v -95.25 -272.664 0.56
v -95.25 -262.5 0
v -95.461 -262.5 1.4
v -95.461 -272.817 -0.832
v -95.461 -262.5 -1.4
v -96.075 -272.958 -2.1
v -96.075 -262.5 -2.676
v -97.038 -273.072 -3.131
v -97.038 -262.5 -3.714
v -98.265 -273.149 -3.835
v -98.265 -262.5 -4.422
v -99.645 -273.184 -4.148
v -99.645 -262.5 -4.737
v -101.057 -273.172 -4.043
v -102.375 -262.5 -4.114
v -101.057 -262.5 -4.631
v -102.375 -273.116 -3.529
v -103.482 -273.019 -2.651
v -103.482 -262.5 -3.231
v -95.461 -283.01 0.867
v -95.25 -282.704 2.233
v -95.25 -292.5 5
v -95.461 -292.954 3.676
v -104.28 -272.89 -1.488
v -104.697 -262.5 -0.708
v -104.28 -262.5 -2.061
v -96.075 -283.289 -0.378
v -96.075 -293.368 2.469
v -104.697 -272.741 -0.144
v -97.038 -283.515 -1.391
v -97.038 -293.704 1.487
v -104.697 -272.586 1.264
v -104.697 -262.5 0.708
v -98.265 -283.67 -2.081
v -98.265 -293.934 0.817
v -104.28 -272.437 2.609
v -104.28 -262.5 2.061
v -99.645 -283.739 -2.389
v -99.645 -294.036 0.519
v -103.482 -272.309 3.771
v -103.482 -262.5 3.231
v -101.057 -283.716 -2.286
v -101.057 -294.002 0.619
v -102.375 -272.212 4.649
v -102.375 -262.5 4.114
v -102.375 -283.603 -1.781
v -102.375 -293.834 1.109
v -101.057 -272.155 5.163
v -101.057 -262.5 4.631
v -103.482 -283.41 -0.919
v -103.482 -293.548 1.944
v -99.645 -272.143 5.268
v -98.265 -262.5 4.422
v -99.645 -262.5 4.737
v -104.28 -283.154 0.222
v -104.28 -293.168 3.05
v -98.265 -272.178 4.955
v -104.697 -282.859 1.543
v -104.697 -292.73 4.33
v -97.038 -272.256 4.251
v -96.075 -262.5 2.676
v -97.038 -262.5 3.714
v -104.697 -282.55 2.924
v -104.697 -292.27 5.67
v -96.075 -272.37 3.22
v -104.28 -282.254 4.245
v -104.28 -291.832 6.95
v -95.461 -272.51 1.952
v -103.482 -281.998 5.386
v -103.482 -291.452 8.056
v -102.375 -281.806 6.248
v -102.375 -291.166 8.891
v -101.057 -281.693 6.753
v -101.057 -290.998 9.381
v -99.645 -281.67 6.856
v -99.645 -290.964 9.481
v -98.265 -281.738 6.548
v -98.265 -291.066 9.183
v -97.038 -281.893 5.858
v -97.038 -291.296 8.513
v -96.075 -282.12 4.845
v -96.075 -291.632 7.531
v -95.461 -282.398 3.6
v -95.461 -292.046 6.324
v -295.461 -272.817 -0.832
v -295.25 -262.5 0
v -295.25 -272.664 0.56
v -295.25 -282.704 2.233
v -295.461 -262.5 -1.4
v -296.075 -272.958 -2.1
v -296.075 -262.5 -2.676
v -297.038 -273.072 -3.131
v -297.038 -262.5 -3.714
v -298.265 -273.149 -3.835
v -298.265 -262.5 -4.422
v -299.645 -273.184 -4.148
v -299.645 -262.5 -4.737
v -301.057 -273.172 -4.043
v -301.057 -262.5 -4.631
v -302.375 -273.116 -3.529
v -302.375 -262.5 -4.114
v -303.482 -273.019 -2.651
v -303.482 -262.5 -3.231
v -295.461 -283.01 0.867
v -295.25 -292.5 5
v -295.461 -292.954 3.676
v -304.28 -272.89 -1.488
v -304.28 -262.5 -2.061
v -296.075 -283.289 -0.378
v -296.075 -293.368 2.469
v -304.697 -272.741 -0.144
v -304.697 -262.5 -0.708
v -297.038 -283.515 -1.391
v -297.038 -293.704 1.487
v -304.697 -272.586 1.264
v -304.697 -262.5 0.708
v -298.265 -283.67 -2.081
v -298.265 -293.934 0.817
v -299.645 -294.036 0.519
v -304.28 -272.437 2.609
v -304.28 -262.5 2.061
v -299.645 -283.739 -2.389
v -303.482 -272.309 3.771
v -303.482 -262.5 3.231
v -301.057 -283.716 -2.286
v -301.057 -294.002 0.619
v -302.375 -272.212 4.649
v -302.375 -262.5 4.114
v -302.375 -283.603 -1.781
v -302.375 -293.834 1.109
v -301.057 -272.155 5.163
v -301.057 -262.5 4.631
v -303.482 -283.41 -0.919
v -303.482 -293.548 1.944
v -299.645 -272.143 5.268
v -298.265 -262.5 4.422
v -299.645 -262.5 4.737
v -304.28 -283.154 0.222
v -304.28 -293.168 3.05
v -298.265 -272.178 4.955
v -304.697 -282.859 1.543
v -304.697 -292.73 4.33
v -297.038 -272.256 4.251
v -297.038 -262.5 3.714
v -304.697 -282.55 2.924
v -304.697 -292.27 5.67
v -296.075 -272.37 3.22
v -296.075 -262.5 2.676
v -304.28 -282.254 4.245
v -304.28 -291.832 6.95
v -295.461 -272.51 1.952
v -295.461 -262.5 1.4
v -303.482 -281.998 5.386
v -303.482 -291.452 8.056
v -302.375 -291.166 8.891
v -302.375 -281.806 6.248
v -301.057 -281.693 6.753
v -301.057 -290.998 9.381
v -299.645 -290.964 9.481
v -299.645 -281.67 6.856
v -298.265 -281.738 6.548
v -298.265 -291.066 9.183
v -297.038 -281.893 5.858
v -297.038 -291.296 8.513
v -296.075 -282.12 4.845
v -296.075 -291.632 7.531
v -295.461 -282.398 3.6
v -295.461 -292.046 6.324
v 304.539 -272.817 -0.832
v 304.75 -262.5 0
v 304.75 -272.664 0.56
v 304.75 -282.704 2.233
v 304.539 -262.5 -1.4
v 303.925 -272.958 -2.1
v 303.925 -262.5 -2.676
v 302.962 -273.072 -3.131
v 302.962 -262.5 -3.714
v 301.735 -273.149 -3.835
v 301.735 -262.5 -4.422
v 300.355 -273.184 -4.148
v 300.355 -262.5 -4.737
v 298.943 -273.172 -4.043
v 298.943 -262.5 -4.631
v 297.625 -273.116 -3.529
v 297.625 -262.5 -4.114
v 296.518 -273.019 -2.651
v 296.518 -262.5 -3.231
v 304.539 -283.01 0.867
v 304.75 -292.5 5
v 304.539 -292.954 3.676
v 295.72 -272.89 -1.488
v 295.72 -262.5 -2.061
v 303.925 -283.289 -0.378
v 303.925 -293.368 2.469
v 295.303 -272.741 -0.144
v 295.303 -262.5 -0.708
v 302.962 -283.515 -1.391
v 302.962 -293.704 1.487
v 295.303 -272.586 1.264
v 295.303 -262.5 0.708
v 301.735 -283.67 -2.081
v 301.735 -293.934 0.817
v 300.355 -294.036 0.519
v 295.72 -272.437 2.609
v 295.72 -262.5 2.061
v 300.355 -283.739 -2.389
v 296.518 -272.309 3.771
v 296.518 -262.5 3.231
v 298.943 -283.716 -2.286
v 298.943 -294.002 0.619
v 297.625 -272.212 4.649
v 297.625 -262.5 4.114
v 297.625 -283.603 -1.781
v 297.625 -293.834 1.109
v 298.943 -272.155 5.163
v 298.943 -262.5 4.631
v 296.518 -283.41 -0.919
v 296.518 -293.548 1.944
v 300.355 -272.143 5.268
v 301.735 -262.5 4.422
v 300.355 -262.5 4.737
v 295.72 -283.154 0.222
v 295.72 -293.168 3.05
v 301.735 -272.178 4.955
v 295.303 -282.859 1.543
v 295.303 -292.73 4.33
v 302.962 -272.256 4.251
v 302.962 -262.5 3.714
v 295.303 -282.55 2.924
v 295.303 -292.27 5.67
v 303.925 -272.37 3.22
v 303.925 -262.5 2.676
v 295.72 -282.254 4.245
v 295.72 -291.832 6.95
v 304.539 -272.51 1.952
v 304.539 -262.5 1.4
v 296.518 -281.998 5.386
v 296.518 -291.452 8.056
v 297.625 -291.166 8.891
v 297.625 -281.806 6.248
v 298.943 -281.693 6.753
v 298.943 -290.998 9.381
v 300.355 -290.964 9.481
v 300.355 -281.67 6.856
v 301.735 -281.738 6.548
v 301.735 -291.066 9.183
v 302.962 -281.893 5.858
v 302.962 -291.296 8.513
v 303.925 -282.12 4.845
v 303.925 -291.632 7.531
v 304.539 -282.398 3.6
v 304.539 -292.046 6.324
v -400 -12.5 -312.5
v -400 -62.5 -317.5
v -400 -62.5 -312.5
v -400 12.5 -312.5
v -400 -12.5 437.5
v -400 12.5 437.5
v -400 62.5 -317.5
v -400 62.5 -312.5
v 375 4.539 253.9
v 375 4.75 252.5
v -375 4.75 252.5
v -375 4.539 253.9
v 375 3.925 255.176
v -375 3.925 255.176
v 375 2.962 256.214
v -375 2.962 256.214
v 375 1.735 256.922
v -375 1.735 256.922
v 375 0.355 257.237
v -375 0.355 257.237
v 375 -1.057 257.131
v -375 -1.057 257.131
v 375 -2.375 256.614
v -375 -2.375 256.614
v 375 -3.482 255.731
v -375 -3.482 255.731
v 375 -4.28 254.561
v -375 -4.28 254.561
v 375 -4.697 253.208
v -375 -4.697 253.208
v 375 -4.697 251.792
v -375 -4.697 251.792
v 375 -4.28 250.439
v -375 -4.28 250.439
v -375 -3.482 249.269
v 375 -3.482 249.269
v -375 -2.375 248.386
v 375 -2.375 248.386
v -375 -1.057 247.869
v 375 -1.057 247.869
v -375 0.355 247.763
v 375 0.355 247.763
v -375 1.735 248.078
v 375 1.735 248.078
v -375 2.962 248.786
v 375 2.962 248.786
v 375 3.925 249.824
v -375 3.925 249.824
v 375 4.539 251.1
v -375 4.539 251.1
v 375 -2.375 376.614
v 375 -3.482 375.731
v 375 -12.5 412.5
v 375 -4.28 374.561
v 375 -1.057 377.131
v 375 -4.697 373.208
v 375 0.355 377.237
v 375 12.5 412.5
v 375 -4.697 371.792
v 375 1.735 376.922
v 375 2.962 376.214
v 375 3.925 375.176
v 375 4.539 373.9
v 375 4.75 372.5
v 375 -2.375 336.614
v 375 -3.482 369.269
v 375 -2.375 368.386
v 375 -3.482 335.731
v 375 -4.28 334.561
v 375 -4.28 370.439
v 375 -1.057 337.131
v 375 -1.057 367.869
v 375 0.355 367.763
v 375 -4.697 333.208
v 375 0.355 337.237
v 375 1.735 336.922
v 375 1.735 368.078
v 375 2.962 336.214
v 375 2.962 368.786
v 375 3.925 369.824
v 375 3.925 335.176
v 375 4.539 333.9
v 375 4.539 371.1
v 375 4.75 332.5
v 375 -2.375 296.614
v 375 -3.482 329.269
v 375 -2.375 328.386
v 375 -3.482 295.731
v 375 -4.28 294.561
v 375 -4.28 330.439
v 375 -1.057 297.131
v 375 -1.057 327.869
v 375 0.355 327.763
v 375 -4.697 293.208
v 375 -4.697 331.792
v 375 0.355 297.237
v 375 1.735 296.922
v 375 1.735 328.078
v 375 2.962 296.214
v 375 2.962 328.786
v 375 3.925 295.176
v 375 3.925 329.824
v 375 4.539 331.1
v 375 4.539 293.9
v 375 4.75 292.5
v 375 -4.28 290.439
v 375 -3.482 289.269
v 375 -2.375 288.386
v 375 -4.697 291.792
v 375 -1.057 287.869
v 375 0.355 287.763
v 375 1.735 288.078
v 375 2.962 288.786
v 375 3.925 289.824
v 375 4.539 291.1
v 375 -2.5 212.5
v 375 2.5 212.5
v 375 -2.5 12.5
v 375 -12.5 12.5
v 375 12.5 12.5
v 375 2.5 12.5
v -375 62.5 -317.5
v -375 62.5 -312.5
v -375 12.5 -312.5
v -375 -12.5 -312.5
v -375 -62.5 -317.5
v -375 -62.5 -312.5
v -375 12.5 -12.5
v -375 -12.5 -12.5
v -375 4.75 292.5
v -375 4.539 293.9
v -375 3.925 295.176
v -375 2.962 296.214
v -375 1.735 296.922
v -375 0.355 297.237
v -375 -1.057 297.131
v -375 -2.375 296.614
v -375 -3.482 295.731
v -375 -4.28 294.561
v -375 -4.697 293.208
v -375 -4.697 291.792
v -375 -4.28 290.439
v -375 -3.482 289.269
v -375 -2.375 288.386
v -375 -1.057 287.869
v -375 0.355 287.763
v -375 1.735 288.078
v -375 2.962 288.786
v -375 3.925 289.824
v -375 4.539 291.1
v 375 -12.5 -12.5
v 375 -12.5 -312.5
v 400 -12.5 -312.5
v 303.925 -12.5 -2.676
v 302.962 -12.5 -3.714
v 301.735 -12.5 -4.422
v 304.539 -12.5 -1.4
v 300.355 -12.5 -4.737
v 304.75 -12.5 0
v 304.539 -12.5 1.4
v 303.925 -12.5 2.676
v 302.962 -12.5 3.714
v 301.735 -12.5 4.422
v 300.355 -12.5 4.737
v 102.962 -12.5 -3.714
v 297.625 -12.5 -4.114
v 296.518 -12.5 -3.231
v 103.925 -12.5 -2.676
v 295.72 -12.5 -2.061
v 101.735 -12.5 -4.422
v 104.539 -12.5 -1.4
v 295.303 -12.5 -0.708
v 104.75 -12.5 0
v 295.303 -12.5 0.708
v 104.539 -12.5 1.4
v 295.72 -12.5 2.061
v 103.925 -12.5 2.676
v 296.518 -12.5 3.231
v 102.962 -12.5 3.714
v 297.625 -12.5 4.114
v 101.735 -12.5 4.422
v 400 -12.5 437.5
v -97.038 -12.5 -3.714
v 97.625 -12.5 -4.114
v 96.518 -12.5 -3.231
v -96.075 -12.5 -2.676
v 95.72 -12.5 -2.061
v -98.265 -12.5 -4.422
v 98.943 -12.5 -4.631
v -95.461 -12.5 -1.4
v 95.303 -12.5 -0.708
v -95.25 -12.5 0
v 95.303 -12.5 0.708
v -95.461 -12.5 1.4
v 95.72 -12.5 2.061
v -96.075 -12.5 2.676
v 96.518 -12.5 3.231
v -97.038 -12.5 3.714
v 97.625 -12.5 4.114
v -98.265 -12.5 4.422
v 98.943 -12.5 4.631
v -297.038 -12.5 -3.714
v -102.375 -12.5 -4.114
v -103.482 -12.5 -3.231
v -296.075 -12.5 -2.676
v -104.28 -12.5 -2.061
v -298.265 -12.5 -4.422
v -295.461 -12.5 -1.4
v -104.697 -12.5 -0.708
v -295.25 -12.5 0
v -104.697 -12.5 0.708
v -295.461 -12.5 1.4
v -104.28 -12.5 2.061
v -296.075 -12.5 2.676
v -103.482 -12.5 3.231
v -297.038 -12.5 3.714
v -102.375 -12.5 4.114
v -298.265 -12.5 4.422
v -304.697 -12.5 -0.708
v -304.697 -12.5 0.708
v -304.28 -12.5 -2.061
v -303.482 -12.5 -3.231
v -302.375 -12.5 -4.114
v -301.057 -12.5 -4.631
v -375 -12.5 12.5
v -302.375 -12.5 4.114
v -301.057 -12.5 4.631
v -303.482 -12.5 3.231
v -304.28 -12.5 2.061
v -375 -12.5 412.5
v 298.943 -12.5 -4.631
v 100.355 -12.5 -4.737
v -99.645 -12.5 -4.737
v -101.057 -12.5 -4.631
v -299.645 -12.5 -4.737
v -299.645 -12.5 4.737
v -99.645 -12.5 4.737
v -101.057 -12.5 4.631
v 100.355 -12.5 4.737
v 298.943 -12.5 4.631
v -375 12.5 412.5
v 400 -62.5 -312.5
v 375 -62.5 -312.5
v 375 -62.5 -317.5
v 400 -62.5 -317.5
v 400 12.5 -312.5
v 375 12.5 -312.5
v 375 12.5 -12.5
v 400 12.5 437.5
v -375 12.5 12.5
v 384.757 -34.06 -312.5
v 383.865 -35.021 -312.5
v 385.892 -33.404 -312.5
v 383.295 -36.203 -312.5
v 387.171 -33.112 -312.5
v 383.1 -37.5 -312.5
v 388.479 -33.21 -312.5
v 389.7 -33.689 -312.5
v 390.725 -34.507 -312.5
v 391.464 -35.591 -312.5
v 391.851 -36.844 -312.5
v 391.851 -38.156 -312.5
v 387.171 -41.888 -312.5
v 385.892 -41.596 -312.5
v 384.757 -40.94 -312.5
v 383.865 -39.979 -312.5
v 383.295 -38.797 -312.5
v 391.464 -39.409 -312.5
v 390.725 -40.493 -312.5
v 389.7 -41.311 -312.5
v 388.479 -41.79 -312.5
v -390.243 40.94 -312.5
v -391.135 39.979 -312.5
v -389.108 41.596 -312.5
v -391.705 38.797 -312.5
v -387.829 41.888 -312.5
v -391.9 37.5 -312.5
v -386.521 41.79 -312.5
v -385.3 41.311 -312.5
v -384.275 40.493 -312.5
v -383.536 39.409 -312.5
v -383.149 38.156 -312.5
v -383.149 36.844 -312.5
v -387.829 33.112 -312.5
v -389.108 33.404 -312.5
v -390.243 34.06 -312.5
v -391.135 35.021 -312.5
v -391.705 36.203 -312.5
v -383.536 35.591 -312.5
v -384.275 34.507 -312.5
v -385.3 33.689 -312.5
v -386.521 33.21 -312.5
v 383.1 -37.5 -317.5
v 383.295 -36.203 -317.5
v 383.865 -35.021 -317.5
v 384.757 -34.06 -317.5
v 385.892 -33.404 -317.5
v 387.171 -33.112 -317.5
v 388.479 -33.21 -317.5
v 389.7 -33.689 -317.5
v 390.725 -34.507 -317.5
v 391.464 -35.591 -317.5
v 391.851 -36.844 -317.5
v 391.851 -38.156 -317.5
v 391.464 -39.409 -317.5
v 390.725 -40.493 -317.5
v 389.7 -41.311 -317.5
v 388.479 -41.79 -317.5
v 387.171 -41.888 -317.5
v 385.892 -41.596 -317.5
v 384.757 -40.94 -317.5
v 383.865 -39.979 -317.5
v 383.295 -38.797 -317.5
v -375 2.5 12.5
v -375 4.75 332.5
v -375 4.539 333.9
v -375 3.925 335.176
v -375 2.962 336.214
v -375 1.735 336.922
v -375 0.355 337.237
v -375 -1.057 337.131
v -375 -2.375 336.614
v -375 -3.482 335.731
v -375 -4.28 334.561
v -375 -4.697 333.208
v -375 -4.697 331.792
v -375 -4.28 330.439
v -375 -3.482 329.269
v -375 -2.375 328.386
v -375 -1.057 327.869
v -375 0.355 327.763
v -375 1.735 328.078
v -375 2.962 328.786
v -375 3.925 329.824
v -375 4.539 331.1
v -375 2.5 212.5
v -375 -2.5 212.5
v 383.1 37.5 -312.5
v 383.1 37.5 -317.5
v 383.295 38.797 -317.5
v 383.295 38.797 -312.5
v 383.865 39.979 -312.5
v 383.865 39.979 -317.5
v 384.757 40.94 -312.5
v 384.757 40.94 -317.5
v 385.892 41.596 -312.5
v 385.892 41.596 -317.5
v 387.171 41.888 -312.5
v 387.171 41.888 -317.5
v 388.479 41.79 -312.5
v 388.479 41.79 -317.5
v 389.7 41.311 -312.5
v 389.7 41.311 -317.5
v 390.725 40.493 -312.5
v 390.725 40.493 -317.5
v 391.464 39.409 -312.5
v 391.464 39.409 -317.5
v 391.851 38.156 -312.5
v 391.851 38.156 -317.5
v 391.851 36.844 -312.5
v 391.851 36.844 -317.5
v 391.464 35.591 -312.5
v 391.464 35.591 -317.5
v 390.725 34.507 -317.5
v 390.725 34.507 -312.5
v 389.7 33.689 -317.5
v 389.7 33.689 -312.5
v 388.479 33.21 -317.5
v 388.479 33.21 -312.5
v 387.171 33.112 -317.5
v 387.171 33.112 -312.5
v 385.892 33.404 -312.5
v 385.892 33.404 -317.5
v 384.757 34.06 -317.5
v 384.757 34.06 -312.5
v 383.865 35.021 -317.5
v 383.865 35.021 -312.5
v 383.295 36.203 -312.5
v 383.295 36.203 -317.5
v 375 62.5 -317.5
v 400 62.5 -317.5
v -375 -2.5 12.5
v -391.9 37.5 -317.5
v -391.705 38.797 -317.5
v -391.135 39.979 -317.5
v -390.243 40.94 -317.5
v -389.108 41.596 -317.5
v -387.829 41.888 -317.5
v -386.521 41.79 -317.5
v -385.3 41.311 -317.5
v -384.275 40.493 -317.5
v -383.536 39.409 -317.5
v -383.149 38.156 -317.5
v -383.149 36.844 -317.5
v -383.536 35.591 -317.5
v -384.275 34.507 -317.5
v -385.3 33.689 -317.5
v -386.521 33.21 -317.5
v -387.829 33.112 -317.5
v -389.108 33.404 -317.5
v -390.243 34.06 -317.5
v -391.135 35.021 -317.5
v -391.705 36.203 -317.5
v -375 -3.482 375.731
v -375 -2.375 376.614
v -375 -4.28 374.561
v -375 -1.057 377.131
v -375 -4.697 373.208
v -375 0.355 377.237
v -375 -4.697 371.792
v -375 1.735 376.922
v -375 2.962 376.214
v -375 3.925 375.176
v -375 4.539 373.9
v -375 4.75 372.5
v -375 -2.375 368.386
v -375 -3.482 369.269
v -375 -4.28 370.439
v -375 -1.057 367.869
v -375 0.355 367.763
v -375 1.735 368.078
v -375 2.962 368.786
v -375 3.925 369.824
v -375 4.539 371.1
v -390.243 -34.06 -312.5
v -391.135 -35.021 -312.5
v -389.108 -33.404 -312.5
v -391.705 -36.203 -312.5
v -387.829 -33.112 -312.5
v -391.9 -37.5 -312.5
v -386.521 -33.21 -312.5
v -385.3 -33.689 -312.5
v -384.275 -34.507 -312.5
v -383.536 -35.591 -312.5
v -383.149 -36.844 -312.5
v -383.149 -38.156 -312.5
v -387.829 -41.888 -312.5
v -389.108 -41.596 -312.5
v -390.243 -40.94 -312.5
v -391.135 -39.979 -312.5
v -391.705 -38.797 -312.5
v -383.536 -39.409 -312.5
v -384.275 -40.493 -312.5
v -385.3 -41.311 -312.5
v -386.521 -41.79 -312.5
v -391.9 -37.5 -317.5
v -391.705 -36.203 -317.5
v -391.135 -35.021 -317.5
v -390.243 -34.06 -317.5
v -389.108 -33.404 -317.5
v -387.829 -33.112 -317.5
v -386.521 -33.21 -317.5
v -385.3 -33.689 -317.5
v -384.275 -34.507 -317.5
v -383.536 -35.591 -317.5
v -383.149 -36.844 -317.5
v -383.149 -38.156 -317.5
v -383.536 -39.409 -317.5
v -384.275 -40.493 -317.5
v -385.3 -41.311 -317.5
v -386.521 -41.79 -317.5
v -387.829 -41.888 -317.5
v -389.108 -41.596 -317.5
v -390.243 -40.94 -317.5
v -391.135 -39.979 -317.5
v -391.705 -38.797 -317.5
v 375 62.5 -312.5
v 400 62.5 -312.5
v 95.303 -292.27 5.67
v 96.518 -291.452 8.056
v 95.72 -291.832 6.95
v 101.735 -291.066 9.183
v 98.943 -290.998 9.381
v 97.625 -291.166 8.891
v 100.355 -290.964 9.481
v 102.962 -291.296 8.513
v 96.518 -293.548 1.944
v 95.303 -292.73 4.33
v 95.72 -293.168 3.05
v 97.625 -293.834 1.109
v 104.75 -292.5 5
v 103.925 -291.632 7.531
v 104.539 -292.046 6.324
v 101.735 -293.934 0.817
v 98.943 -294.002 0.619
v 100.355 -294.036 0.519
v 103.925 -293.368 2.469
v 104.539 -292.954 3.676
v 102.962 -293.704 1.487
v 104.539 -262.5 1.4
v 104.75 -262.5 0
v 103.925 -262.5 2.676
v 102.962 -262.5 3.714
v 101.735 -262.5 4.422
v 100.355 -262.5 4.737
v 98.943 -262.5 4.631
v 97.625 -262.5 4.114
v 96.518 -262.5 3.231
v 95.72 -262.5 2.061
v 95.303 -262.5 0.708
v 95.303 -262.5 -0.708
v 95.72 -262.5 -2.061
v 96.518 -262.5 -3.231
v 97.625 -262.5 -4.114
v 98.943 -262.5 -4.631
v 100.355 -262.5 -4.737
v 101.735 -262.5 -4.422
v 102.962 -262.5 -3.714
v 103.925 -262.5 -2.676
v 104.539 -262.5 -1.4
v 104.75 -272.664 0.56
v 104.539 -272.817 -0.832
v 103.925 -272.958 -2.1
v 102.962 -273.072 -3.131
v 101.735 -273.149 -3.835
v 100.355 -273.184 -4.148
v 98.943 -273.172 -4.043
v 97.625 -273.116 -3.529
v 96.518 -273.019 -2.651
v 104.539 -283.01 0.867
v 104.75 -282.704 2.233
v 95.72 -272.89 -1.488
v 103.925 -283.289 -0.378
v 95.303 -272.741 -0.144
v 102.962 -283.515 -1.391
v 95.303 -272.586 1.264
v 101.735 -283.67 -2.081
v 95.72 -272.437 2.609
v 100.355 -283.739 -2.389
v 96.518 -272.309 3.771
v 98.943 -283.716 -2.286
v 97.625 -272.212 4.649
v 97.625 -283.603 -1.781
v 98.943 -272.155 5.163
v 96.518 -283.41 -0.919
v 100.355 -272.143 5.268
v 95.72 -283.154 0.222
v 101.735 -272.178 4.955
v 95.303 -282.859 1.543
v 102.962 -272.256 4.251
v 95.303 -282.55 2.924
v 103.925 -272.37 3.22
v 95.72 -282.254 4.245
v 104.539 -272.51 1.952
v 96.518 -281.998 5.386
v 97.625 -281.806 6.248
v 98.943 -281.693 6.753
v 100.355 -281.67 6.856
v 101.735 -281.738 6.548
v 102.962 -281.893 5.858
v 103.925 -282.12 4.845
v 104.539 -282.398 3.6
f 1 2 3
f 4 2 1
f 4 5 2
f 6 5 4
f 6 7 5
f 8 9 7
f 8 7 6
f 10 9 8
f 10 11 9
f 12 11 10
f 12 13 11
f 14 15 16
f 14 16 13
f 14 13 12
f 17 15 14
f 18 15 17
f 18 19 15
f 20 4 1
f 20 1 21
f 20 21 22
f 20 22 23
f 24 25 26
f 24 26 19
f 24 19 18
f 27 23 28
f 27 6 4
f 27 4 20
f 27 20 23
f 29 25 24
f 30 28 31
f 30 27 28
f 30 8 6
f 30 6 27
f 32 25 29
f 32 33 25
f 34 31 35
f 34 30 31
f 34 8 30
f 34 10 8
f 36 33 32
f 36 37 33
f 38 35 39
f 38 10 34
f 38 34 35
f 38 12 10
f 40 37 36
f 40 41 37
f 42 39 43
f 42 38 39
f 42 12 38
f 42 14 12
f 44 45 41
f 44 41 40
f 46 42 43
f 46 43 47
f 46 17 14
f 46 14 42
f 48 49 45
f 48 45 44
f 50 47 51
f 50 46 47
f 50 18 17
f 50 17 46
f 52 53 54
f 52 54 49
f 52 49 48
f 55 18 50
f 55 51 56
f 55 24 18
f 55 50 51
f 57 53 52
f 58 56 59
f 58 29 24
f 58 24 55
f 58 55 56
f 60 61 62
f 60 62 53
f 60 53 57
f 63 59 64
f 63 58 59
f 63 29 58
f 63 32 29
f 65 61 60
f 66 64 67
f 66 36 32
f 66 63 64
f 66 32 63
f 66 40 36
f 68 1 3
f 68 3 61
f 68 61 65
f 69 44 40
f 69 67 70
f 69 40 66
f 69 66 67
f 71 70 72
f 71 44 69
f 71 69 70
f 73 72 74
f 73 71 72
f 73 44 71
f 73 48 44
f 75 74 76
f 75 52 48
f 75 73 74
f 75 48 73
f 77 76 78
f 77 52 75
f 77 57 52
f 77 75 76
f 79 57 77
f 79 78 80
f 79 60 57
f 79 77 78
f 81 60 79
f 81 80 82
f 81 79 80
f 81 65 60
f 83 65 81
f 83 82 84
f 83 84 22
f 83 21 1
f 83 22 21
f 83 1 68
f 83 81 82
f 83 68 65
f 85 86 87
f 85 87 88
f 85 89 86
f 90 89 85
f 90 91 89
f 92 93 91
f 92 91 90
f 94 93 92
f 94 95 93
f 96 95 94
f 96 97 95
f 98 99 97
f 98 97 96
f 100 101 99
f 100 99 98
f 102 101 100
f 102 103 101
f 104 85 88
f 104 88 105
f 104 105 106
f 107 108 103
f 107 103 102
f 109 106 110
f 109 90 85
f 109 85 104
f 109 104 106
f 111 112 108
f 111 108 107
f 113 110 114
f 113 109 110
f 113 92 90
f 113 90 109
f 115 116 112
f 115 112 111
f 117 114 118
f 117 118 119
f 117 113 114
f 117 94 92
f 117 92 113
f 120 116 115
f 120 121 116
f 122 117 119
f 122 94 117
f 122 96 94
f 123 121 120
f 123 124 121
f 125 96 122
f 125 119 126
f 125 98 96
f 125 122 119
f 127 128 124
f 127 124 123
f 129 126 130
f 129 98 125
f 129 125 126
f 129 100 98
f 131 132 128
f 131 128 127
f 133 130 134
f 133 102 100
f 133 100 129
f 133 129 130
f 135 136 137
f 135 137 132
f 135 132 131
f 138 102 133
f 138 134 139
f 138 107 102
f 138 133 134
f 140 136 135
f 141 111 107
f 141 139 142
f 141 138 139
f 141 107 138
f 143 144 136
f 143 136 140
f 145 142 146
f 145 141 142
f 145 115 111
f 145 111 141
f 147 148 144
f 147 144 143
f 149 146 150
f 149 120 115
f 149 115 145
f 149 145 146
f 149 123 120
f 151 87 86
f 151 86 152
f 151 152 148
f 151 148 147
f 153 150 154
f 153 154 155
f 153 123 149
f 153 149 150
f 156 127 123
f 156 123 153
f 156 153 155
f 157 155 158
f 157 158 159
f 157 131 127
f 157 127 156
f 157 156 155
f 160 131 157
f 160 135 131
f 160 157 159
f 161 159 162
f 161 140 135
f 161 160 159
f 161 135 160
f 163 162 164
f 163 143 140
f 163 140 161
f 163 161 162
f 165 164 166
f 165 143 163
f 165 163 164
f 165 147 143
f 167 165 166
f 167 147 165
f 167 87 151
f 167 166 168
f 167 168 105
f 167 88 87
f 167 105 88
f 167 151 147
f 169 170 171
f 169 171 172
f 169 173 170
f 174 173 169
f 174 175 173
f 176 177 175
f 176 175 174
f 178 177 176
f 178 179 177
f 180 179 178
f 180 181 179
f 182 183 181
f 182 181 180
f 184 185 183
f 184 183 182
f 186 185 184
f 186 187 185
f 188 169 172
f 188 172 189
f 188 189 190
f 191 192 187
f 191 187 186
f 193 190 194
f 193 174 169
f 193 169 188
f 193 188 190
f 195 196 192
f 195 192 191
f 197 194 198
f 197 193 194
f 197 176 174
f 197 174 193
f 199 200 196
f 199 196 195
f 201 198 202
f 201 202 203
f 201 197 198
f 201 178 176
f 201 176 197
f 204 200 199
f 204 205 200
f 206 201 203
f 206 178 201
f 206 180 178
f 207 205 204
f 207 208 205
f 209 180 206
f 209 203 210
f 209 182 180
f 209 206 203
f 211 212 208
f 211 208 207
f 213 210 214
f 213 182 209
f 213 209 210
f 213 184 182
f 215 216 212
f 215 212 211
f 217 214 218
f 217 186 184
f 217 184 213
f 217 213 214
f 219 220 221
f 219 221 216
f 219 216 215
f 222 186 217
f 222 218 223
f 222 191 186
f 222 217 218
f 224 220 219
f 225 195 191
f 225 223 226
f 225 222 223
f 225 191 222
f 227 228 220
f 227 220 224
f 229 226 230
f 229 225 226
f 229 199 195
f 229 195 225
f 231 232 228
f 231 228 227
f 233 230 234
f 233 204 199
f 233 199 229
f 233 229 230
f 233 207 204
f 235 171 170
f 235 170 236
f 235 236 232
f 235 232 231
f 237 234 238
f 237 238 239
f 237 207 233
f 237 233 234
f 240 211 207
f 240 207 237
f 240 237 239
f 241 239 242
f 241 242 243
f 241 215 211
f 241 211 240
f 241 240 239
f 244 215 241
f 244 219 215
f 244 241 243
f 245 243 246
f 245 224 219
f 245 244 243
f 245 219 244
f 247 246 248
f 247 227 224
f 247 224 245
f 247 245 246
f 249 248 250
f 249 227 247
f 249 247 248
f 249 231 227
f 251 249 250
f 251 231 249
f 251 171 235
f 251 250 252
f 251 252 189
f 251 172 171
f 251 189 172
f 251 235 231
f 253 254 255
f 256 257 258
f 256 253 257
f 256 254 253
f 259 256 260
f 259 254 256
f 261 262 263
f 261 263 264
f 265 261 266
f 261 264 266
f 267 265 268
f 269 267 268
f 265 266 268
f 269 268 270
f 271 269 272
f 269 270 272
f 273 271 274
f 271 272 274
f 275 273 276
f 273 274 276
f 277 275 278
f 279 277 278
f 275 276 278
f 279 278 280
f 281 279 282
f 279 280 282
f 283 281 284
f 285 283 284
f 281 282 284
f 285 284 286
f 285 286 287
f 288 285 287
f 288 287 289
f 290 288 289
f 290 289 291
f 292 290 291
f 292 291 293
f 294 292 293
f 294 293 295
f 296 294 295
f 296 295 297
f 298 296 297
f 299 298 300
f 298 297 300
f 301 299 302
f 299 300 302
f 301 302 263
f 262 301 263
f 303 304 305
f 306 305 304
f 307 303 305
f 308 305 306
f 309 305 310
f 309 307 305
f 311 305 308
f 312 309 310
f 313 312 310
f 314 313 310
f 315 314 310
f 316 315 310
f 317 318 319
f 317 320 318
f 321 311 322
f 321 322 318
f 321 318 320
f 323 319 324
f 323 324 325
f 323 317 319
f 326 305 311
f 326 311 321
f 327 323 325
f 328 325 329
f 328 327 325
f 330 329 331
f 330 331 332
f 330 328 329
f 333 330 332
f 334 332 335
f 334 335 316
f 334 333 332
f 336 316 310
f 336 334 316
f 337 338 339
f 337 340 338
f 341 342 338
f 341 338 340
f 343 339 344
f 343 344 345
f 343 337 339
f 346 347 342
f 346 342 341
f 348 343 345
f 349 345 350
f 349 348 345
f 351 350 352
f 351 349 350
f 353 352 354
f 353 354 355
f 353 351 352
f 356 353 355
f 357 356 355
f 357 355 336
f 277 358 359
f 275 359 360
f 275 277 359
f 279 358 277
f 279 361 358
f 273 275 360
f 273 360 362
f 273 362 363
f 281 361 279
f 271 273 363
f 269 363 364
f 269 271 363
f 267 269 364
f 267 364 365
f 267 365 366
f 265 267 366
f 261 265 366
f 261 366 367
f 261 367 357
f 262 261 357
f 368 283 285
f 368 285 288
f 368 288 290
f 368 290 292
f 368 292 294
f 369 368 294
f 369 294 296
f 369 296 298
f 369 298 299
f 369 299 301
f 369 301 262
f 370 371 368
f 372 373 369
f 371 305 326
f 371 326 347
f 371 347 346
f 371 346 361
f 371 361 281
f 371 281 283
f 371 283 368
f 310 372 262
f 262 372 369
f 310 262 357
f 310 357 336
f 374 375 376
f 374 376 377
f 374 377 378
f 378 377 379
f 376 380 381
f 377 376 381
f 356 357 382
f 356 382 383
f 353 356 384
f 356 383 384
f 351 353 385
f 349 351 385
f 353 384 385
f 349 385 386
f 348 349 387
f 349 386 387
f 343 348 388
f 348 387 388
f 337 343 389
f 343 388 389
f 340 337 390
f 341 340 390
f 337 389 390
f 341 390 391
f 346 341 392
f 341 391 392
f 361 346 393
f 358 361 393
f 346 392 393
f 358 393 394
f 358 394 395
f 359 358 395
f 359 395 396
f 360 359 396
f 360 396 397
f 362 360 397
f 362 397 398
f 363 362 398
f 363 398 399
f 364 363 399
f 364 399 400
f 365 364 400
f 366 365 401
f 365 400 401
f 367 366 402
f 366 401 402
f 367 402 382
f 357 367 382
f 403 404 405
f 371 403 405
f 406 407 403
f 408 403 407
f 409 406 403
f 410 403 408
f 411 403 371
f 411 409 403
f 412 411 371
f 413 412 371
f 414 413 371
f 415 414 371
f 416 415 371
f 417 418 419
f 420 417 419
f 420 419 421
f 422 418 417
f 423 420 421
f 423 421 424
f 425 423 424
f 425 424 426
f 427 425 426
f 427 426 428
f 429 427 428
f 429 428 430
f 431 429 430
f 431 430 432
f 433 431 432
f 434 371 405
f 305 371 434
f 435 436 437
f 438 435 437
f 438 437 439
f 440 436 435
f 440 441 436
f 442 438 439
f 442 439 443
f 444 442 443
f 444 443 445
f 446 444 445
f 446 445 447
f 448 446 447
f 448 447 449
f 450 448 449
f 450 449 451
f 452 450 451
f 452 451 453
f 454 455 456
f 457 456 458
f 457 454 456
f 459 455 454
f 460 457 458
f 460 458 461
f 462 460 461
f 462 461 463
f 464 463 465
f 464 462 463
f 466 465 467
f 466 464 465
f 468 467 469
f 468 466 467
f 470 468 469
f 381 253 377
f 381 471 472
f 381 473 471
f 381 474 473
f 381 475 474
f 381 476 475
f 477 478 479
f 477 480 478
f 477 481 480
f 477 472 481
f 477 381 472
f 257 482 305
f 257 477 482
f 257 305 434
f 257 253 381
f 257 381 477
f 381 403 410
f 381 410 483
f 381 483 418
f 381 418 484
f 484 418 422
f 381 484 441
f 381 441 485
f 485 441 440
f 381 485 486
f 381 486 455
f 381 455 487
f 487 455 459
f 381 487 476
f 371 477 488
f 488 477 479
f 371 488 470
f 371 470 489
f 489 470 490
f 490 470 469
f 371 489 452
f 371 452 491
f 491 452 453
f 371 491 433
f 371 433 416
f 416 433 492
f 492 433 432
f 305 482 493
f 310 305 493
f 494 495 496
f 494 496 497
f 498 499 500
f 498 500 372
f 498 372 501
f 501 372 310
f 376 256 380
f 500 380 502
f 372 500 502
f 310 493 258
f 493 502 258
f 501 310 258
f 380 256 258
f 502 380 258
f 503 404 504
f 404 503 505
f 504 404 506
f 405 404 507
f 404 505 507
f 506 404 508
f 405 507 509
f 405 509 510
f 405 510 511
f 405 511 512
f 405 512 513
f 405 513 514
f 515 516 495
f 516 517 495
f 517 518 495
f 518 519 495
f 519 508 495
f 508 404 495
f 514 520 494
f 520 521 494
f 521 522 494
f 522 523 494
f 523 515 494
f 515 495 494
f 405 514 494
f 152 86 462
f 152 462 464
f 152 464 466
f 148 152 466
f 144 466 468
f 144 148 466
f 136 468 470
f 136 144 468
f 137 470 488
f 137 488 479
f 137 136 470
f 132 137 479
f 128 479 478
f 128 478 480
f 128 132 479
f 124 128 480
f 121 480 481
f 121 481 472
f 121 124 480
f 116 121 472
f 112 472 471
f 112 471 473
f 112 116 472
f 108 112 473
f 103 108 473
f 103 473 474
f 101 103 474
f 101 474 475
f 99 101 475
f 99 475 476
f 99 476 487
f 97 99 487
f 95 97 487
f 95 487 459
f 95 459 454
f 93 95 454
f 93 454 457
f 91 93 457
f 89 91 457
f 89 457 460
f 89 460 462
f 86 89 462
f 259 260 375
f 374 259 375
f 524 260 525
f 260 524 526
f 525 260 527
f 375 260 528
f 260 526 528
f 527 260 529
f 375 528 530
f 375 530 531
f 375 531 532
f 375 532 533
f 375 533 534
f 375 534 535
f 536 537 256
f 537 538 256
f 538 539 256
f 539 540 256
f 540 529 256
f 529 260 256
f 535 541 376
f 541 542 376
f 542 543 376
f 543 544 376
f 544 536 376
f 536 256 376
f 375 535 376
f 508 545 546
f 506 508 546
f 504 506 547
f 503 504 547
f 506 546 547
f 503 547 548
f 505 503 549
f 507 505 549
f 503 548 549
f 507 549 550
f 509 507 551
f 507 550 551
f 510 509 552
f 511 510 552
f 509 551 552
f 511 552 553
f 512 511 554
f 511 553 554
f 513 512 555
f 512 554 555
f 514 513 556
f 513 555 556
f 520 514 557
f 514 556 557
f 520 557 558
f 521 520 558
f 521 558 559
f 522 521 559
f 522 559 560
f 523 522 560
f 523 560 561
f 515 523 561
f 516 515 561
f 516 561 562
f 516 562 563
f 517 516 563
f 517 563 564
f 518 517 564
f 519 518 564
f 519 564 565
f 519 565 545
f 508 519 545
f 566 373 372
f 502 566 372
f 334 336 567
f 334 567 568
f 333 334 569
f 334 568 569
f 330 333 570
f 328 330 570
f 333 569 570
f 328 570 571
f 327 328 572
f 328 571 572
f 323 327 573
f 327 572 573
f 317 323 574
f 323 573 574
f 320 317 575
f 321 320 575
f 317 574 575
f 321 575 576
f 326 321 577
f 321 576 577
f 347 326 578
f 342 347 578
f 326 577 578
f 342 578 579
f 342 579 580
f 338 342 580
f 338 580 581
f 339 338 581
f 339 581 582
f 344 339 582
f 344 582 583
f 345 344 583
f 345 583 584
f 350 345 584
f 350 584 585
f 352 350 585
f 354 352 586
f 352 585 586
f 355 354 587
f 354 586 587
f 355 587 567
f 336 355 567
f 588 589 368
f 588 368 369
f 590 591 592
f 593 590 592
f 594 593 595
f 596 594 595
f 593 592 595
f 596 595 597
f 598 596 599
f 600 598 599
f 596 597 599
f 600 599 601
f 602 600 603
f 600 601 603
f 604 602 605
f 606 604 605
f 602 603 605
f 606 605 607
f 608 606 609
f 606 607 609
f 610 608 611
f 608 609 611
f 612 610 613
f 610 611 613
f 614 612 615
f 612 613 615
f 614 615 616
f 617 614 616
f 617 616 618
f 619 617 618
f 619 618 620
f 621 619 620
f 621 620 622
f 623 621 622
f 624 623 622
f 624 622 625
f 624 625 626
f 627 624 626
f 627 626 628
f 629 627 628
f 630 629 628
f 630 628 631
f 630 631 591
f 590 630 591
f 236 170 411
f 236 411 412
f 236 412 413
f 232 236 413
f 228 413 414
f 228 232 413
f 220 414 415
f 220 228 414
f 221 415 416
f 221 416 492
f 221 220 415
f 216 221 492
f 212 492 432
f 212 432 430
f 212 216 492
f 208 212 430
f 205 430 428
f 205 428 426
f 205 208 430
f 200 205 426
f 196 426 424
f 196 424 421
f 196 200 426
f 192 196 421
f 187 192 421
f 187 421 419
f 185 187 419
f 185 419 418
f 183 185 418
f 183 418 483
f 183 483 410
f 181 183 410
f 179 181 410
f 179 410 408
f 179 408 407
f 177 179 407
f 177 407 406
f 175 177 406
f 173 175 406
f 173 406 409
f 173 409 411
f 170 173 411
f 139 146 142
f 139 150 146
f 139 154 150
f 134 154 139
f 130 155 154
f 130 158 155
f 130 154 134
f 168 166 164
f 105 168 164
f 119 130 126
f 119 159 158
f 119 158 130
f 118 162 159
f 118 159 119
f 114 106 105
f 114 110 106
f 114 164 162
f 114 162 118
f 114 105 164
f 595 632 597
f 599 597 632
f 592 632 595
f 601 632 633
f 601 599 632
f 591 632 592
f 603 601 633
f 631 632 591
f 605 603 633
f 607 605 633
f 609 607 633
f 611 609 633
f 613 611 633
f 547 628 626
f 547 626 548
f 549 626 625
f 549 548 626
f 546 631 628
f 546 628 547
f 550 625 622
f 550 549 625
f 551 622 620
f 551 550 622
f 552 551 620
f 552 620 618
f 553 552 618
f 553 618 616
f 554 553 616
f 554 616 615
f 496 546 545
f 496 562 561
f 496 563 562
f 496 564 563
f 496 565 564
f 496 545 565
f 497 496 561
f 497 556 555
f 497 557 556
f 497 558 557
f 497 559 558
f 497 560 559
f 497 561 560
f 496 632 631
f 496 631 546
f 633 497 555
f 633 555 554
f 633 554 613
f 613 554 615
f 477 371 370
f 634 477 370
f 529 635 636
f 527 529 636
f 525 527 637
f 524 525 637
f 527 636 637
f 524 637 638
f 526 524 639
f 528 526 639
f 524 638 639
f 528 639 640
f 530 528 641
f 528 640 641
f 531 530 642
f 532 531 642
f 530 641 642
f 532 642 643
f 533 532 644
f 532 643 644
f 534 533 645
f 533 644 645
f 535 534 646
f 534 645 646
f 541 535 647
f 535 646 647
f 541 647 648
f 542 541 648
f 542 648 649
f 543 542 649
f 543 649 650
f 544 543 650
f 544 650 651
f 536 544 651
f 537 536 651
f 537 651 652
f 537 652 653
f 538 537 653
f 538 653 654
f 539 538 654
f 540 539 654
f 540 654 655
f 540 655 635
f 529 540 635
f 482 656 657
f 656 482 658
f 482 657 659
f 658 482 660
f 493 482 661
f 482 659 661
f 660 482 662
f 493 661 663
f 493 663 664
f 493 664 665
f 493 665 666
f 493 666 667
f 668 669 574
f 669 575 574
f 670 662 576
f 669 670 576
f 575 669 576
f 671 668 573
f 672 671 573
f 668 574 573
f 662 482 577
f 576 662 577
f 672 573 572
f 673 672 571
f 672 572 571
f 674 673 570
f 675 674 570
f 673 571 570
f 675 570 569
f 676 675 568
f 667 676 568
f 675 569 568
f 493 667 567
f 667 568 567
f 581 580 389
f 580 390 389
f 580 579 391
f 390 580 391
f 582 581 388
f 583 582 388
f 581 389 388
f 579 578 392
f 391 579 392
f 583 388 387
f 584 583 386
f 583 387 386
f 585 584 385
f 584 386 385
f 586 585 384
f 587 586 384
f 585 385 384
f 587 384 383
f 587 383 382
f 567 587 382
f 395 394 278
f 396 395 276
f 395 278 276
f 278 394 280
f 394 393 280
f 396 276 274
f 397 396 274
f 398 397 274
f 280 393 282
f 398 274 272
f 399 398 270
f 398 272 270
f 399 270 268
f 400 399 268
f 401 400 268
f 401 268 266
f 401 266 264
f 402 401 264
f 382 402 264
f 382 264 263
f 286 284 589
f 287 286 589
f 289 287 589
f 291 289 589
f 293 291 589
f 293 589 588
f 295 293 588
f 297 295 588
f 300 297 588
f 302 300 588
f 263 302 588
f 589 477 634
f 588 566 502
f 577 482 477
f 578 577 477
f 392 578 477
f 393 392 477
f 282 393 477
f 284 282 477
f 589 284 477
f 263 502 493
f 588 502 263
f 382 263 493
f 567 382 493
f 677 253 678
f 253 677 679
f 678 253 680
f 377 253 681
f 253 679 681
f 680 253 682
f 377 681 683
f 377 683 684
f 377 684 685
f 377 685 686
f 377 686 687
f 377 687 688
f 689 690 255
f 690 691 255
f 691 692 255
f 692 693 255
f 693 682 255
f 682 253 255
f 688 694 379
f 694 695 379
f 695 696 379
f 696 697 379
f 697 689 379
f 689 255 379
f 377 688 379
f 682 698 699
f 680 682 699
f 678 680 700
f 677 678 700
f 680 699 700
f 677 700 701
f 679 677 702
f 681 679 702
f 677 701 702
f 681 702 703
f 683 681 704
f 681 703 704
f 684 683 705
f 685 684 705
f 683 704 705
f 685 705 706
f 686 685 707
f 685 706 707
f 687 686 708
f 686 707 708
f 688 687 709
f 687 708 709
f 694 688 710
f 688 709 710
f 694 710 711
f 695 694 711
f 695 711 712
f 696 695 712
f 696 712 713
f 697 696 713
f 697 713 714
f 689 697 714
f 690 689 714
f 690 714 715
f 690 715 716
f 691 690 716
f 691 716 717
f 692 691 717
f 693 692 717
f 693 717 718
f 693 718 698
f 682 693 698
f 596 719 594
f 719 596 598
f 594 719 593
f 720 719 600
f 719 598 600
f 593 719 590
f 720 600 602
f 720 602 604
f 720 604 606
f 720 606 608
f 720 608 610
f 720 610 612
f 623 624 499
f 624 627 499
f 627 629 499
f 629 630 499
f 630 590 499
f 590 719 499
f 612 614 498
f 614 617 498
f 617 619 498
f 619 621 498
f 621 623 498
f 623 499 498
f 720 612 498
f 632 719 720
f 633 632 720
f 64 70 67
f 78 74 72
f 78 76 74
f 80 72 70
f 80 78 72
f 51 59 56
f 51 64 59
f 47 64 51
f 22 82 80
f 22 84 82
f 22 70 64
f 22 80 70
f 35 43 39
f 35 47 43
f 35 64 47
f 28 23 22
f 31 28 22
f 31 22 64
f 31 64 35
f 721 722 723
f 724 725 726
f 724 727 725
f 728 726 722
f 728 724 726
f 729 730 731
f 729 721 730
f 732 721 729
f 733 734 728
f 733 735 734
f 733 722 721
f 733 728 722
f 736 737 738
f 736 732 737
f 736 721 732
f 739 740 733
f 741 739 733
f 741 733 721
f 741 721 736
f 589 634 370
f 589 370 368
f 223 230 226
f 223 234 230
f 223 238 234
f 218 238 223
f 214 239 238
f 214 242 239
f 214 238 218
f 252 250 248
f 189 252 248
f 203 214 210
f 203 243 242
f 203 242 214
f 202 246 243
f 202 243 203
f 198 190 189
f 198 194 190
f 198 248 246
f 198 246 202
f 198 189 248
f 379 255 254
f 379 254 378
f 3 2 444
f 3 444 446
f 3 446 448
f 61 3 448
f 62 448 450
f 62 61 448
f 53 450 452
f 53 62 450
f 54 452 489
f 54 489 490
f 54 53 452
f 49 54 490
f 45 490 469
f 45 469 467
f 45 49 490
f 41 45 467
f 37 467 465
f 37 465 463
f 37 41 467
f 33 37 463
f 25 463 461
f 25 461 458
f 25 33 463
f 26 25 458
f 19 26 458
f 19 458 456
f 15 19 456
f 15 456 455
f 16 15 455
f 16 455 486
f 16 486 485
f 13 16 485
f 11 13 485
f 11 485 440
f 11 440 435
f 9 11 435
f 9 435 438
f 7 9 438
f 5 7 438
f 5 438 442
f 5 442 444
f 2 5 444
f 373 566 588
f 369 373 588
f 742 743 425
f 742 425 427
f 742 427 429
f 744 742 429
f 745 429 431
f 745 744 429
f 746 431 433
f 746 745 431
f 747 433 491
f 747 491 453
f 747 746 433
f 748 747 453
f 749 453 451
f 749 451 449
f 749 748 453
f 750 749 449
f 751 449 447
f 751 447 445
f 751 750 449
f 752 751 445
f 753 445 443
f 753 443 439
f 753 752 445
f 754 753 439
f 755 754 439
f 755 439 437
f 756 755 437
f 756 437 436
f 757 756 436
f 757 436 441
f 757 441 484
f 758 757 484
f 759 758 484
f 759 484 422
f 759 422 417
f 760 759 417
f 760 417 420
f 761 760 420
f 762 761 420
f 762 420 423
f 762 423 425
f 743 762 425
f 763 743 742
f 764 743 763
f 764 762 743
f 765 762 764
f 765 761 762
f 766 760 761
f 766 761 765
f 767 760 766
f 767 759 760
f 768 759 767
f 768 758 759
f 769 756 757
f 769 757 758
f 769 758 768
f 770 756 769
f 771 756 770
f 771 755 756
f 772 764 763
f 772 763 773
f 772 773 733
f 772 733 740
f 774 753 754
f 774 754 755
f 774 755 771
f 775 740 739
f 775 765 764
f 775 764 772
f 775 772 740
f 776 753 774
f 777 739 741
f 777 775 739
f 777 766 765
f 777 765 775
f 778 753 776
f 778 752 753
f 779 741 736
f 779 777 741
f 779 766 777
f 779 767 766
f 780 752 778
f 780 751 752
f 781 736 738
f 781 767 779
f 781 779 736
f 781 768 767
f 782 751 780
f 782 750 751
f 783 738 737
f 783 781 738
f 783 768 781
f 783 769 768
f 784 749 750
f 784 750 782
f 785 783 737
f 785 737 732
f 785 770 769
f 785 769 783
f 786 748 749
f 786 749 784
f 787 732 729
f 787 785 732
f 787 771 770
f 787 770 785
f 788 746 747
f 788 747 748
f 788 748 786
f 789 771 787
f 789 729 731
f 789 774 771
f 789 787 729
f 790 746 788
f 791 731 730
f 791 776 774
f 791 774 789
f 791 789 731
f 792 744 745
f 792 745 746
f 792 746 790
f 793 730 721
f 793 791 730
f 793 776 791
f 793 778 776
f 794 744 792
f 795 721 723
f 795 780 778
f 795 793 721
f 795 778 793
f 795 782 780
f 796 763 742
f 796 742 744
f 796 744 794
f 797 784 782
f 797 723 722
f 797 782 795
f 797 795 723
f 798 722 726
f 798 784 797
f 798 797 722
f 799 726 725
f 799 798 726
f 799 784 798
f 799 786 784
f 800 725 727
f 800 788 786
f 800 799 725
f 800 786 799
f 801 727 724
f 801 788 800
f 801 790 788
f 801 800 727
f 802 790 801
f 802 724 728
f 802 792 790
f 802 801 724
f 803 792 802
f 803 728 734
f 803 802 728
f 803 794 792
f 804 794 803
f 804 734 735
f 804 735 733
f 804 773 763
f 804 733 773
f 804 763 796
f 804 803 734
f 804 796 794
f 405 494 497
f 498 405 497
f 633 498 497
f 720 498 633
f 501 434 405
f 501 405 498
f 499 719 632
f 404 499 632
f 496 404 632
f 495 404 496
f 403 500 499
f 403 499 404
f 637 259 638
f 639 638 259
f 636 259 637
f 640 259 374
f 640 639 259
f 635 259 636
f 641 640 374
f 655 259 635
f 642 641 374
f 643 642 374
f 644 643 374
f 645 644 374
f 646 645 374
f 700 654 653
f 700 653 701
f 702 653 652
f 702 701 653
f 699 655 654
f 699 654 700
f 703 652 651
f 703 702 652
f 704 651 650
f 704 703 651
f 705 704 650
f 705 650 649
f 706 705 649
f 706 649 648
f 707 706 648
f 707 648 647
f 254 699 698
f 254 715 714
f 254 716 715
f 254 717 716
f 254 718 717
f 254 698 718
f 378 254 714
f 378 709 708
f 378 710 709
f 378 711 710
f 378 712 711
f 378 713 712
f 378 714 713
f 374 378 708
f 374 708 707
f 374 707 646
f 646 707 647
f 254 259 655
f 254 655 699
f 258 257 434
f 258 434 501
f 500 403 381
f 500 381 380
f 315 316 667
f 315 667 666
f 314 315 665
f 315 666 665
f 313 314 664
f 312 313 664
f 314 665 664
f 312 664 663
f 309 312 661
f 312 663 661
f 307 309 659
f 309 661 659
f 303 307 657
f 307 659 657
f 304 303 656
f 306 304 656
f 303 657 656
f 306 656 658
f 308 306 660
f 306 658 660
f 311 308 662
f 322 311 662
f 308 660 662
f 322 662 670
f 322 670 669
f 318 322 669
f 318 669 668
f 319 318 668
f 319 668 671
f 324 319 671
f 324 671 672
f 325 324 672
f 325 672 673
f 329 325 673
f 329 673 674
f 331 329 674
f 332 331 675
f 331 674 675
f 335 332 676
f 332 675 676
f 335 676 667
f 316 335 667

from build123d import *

# Parameters (mm, degrees)
F0_W          = 25
F0_H          = 25
F1_DEPTH      = 400
F1_DEPTH_BACK = 400
F2_R          = 4.75
F5_W          = 25
F5_H          = 25
F6_DEPTH      = 300
F7_W          = 25
F7_H          = 25
F7_H_2        = 50
F8_DEPTH      = 5
F9_W          = 25
F9_H          = 25
F10_DEPTH     = 425
F11_W         = 25
F11_H         = 25
F12_DEPTH     = 750
F13_W         = 5
F13_H         = 200
F13_R         = 4.75
F14_DEPTH     = 750
F16_D         = 8.8


with BuildPart() as f1:
    # F0 (on Right) → F1 (new body, two sides)
    with BuildSketch(Plane.YZ) as f1_sk:
        Rectangle(F0_W, F0_H)
    extrude(amount=F1_DEPTH)
    extrude(f1_sk.sketch, amount=-F1_DEPTH_BACK)

    # F4: sweep along a path in F3
    with BuildLine(Plane.YZ) as f4_path:
        Line((-12.5, 0), (-262.5, 0))
        ThreePointArc((-262.5, 0), (-277.7069063257, 1.2585620455), (-292.5, 5))
    # F2 (on face) → F4 (sweep)
    with BuildSketch(Plane.XZ.offset(12.5)):
        with Locations((-100, 0)):
            Circle(F2_R)
        with Locations((100, 0)):
            Circle(F2_R)
        with Locations((-300, 0)):
            Circle(F2_R)
        with Locations((300, 0)):
            Circle(F2_R)
    sweep(path=f4_path.line)

    # F5 (on face) → F6 (join)
    with BuildSketch(Plane(origin=(0, 0, -12.5), x_dir=(1, 0, 0), z_dir=(0, 0, -1))):
        with Locations((-387.5, 0)):
            Rectangle(F5_W, F5_H)
        with Locations((387.5, 0)):
            Rectangle(F5_W, F5_H)
    extrude(amount=F6_DEPTH)

    # F7 (on face) → F8 (join)
    with BuildSketch(Plane(origin=(0, 0, -312.5), x_dir=(1, 0, 0), z_dir=(0, 0, -1))):
        with Locations((-387.5, 0)):
            Rectangle(F7_W, F7_H)
        with Locations((-387.5, -37.5)):
            Rectangle(F7_W, F7_H_2)
        with Locations((-387.5, 37.5)):
            Rectangle(F7_W, F7_H_2)
        with Locations((387.5, 0)):
            Rectangle(F7_W, F7_H)
        with Locations((387.5, 37.5)):
            Rectangle(F7_W, F7_H_2)
        with Locations((387.5, -37.5)):
            Rectangle(F7_W, F7_H_2)
    extrude(amount=F8_DEPTH)

    # F9 (on face) → F10 (join)
    with BuildSketch(Plane.XY.offset(12.5)):
        with Locations((-387.5, 0)):
            Rectangle(F9_W, F9_H)
        with Locations((387.5, 0)):
            Rectangle(F9_W, F9_H)
    extrude(amount=F10_DEPTH)

    # F11 (on face) → F12 (join, through all)
    with BuildSketch(Plane.YZ.offset(-375)):
        with Locations((0, 425)):
            Rectangle(F11_W, F11_H)
    extrude(amount=F12_DEPTH)

    # F13 (on face) → F14 (join, through all)
    with BuildSketch(Plane.YZ.offset(-375)):
        with Locations((0, 112.5)):
            Rectangle(F13_W, F13_H)
        with Locations((0, 372.5)):
            Circle(F13_R)
        with Locations((0, 332.5)):
            Circle(F13_R)
        with Locations((0, 292.5)):
            Circle(F13_R)
        with Locations((0, 252.5)):
            Circle(F13_R)
    extrude(amount=F14_DEPTH)

    # F16 (through all)
    with Locations(Plane.XY.offset(-312.5)):
        with Locations((-387.5, -37.5), (-387.5, 37.5), (387.5, -37.5), (387.5, 37.5)):
            Hole(F16_D / 2)


solid = f1.part
